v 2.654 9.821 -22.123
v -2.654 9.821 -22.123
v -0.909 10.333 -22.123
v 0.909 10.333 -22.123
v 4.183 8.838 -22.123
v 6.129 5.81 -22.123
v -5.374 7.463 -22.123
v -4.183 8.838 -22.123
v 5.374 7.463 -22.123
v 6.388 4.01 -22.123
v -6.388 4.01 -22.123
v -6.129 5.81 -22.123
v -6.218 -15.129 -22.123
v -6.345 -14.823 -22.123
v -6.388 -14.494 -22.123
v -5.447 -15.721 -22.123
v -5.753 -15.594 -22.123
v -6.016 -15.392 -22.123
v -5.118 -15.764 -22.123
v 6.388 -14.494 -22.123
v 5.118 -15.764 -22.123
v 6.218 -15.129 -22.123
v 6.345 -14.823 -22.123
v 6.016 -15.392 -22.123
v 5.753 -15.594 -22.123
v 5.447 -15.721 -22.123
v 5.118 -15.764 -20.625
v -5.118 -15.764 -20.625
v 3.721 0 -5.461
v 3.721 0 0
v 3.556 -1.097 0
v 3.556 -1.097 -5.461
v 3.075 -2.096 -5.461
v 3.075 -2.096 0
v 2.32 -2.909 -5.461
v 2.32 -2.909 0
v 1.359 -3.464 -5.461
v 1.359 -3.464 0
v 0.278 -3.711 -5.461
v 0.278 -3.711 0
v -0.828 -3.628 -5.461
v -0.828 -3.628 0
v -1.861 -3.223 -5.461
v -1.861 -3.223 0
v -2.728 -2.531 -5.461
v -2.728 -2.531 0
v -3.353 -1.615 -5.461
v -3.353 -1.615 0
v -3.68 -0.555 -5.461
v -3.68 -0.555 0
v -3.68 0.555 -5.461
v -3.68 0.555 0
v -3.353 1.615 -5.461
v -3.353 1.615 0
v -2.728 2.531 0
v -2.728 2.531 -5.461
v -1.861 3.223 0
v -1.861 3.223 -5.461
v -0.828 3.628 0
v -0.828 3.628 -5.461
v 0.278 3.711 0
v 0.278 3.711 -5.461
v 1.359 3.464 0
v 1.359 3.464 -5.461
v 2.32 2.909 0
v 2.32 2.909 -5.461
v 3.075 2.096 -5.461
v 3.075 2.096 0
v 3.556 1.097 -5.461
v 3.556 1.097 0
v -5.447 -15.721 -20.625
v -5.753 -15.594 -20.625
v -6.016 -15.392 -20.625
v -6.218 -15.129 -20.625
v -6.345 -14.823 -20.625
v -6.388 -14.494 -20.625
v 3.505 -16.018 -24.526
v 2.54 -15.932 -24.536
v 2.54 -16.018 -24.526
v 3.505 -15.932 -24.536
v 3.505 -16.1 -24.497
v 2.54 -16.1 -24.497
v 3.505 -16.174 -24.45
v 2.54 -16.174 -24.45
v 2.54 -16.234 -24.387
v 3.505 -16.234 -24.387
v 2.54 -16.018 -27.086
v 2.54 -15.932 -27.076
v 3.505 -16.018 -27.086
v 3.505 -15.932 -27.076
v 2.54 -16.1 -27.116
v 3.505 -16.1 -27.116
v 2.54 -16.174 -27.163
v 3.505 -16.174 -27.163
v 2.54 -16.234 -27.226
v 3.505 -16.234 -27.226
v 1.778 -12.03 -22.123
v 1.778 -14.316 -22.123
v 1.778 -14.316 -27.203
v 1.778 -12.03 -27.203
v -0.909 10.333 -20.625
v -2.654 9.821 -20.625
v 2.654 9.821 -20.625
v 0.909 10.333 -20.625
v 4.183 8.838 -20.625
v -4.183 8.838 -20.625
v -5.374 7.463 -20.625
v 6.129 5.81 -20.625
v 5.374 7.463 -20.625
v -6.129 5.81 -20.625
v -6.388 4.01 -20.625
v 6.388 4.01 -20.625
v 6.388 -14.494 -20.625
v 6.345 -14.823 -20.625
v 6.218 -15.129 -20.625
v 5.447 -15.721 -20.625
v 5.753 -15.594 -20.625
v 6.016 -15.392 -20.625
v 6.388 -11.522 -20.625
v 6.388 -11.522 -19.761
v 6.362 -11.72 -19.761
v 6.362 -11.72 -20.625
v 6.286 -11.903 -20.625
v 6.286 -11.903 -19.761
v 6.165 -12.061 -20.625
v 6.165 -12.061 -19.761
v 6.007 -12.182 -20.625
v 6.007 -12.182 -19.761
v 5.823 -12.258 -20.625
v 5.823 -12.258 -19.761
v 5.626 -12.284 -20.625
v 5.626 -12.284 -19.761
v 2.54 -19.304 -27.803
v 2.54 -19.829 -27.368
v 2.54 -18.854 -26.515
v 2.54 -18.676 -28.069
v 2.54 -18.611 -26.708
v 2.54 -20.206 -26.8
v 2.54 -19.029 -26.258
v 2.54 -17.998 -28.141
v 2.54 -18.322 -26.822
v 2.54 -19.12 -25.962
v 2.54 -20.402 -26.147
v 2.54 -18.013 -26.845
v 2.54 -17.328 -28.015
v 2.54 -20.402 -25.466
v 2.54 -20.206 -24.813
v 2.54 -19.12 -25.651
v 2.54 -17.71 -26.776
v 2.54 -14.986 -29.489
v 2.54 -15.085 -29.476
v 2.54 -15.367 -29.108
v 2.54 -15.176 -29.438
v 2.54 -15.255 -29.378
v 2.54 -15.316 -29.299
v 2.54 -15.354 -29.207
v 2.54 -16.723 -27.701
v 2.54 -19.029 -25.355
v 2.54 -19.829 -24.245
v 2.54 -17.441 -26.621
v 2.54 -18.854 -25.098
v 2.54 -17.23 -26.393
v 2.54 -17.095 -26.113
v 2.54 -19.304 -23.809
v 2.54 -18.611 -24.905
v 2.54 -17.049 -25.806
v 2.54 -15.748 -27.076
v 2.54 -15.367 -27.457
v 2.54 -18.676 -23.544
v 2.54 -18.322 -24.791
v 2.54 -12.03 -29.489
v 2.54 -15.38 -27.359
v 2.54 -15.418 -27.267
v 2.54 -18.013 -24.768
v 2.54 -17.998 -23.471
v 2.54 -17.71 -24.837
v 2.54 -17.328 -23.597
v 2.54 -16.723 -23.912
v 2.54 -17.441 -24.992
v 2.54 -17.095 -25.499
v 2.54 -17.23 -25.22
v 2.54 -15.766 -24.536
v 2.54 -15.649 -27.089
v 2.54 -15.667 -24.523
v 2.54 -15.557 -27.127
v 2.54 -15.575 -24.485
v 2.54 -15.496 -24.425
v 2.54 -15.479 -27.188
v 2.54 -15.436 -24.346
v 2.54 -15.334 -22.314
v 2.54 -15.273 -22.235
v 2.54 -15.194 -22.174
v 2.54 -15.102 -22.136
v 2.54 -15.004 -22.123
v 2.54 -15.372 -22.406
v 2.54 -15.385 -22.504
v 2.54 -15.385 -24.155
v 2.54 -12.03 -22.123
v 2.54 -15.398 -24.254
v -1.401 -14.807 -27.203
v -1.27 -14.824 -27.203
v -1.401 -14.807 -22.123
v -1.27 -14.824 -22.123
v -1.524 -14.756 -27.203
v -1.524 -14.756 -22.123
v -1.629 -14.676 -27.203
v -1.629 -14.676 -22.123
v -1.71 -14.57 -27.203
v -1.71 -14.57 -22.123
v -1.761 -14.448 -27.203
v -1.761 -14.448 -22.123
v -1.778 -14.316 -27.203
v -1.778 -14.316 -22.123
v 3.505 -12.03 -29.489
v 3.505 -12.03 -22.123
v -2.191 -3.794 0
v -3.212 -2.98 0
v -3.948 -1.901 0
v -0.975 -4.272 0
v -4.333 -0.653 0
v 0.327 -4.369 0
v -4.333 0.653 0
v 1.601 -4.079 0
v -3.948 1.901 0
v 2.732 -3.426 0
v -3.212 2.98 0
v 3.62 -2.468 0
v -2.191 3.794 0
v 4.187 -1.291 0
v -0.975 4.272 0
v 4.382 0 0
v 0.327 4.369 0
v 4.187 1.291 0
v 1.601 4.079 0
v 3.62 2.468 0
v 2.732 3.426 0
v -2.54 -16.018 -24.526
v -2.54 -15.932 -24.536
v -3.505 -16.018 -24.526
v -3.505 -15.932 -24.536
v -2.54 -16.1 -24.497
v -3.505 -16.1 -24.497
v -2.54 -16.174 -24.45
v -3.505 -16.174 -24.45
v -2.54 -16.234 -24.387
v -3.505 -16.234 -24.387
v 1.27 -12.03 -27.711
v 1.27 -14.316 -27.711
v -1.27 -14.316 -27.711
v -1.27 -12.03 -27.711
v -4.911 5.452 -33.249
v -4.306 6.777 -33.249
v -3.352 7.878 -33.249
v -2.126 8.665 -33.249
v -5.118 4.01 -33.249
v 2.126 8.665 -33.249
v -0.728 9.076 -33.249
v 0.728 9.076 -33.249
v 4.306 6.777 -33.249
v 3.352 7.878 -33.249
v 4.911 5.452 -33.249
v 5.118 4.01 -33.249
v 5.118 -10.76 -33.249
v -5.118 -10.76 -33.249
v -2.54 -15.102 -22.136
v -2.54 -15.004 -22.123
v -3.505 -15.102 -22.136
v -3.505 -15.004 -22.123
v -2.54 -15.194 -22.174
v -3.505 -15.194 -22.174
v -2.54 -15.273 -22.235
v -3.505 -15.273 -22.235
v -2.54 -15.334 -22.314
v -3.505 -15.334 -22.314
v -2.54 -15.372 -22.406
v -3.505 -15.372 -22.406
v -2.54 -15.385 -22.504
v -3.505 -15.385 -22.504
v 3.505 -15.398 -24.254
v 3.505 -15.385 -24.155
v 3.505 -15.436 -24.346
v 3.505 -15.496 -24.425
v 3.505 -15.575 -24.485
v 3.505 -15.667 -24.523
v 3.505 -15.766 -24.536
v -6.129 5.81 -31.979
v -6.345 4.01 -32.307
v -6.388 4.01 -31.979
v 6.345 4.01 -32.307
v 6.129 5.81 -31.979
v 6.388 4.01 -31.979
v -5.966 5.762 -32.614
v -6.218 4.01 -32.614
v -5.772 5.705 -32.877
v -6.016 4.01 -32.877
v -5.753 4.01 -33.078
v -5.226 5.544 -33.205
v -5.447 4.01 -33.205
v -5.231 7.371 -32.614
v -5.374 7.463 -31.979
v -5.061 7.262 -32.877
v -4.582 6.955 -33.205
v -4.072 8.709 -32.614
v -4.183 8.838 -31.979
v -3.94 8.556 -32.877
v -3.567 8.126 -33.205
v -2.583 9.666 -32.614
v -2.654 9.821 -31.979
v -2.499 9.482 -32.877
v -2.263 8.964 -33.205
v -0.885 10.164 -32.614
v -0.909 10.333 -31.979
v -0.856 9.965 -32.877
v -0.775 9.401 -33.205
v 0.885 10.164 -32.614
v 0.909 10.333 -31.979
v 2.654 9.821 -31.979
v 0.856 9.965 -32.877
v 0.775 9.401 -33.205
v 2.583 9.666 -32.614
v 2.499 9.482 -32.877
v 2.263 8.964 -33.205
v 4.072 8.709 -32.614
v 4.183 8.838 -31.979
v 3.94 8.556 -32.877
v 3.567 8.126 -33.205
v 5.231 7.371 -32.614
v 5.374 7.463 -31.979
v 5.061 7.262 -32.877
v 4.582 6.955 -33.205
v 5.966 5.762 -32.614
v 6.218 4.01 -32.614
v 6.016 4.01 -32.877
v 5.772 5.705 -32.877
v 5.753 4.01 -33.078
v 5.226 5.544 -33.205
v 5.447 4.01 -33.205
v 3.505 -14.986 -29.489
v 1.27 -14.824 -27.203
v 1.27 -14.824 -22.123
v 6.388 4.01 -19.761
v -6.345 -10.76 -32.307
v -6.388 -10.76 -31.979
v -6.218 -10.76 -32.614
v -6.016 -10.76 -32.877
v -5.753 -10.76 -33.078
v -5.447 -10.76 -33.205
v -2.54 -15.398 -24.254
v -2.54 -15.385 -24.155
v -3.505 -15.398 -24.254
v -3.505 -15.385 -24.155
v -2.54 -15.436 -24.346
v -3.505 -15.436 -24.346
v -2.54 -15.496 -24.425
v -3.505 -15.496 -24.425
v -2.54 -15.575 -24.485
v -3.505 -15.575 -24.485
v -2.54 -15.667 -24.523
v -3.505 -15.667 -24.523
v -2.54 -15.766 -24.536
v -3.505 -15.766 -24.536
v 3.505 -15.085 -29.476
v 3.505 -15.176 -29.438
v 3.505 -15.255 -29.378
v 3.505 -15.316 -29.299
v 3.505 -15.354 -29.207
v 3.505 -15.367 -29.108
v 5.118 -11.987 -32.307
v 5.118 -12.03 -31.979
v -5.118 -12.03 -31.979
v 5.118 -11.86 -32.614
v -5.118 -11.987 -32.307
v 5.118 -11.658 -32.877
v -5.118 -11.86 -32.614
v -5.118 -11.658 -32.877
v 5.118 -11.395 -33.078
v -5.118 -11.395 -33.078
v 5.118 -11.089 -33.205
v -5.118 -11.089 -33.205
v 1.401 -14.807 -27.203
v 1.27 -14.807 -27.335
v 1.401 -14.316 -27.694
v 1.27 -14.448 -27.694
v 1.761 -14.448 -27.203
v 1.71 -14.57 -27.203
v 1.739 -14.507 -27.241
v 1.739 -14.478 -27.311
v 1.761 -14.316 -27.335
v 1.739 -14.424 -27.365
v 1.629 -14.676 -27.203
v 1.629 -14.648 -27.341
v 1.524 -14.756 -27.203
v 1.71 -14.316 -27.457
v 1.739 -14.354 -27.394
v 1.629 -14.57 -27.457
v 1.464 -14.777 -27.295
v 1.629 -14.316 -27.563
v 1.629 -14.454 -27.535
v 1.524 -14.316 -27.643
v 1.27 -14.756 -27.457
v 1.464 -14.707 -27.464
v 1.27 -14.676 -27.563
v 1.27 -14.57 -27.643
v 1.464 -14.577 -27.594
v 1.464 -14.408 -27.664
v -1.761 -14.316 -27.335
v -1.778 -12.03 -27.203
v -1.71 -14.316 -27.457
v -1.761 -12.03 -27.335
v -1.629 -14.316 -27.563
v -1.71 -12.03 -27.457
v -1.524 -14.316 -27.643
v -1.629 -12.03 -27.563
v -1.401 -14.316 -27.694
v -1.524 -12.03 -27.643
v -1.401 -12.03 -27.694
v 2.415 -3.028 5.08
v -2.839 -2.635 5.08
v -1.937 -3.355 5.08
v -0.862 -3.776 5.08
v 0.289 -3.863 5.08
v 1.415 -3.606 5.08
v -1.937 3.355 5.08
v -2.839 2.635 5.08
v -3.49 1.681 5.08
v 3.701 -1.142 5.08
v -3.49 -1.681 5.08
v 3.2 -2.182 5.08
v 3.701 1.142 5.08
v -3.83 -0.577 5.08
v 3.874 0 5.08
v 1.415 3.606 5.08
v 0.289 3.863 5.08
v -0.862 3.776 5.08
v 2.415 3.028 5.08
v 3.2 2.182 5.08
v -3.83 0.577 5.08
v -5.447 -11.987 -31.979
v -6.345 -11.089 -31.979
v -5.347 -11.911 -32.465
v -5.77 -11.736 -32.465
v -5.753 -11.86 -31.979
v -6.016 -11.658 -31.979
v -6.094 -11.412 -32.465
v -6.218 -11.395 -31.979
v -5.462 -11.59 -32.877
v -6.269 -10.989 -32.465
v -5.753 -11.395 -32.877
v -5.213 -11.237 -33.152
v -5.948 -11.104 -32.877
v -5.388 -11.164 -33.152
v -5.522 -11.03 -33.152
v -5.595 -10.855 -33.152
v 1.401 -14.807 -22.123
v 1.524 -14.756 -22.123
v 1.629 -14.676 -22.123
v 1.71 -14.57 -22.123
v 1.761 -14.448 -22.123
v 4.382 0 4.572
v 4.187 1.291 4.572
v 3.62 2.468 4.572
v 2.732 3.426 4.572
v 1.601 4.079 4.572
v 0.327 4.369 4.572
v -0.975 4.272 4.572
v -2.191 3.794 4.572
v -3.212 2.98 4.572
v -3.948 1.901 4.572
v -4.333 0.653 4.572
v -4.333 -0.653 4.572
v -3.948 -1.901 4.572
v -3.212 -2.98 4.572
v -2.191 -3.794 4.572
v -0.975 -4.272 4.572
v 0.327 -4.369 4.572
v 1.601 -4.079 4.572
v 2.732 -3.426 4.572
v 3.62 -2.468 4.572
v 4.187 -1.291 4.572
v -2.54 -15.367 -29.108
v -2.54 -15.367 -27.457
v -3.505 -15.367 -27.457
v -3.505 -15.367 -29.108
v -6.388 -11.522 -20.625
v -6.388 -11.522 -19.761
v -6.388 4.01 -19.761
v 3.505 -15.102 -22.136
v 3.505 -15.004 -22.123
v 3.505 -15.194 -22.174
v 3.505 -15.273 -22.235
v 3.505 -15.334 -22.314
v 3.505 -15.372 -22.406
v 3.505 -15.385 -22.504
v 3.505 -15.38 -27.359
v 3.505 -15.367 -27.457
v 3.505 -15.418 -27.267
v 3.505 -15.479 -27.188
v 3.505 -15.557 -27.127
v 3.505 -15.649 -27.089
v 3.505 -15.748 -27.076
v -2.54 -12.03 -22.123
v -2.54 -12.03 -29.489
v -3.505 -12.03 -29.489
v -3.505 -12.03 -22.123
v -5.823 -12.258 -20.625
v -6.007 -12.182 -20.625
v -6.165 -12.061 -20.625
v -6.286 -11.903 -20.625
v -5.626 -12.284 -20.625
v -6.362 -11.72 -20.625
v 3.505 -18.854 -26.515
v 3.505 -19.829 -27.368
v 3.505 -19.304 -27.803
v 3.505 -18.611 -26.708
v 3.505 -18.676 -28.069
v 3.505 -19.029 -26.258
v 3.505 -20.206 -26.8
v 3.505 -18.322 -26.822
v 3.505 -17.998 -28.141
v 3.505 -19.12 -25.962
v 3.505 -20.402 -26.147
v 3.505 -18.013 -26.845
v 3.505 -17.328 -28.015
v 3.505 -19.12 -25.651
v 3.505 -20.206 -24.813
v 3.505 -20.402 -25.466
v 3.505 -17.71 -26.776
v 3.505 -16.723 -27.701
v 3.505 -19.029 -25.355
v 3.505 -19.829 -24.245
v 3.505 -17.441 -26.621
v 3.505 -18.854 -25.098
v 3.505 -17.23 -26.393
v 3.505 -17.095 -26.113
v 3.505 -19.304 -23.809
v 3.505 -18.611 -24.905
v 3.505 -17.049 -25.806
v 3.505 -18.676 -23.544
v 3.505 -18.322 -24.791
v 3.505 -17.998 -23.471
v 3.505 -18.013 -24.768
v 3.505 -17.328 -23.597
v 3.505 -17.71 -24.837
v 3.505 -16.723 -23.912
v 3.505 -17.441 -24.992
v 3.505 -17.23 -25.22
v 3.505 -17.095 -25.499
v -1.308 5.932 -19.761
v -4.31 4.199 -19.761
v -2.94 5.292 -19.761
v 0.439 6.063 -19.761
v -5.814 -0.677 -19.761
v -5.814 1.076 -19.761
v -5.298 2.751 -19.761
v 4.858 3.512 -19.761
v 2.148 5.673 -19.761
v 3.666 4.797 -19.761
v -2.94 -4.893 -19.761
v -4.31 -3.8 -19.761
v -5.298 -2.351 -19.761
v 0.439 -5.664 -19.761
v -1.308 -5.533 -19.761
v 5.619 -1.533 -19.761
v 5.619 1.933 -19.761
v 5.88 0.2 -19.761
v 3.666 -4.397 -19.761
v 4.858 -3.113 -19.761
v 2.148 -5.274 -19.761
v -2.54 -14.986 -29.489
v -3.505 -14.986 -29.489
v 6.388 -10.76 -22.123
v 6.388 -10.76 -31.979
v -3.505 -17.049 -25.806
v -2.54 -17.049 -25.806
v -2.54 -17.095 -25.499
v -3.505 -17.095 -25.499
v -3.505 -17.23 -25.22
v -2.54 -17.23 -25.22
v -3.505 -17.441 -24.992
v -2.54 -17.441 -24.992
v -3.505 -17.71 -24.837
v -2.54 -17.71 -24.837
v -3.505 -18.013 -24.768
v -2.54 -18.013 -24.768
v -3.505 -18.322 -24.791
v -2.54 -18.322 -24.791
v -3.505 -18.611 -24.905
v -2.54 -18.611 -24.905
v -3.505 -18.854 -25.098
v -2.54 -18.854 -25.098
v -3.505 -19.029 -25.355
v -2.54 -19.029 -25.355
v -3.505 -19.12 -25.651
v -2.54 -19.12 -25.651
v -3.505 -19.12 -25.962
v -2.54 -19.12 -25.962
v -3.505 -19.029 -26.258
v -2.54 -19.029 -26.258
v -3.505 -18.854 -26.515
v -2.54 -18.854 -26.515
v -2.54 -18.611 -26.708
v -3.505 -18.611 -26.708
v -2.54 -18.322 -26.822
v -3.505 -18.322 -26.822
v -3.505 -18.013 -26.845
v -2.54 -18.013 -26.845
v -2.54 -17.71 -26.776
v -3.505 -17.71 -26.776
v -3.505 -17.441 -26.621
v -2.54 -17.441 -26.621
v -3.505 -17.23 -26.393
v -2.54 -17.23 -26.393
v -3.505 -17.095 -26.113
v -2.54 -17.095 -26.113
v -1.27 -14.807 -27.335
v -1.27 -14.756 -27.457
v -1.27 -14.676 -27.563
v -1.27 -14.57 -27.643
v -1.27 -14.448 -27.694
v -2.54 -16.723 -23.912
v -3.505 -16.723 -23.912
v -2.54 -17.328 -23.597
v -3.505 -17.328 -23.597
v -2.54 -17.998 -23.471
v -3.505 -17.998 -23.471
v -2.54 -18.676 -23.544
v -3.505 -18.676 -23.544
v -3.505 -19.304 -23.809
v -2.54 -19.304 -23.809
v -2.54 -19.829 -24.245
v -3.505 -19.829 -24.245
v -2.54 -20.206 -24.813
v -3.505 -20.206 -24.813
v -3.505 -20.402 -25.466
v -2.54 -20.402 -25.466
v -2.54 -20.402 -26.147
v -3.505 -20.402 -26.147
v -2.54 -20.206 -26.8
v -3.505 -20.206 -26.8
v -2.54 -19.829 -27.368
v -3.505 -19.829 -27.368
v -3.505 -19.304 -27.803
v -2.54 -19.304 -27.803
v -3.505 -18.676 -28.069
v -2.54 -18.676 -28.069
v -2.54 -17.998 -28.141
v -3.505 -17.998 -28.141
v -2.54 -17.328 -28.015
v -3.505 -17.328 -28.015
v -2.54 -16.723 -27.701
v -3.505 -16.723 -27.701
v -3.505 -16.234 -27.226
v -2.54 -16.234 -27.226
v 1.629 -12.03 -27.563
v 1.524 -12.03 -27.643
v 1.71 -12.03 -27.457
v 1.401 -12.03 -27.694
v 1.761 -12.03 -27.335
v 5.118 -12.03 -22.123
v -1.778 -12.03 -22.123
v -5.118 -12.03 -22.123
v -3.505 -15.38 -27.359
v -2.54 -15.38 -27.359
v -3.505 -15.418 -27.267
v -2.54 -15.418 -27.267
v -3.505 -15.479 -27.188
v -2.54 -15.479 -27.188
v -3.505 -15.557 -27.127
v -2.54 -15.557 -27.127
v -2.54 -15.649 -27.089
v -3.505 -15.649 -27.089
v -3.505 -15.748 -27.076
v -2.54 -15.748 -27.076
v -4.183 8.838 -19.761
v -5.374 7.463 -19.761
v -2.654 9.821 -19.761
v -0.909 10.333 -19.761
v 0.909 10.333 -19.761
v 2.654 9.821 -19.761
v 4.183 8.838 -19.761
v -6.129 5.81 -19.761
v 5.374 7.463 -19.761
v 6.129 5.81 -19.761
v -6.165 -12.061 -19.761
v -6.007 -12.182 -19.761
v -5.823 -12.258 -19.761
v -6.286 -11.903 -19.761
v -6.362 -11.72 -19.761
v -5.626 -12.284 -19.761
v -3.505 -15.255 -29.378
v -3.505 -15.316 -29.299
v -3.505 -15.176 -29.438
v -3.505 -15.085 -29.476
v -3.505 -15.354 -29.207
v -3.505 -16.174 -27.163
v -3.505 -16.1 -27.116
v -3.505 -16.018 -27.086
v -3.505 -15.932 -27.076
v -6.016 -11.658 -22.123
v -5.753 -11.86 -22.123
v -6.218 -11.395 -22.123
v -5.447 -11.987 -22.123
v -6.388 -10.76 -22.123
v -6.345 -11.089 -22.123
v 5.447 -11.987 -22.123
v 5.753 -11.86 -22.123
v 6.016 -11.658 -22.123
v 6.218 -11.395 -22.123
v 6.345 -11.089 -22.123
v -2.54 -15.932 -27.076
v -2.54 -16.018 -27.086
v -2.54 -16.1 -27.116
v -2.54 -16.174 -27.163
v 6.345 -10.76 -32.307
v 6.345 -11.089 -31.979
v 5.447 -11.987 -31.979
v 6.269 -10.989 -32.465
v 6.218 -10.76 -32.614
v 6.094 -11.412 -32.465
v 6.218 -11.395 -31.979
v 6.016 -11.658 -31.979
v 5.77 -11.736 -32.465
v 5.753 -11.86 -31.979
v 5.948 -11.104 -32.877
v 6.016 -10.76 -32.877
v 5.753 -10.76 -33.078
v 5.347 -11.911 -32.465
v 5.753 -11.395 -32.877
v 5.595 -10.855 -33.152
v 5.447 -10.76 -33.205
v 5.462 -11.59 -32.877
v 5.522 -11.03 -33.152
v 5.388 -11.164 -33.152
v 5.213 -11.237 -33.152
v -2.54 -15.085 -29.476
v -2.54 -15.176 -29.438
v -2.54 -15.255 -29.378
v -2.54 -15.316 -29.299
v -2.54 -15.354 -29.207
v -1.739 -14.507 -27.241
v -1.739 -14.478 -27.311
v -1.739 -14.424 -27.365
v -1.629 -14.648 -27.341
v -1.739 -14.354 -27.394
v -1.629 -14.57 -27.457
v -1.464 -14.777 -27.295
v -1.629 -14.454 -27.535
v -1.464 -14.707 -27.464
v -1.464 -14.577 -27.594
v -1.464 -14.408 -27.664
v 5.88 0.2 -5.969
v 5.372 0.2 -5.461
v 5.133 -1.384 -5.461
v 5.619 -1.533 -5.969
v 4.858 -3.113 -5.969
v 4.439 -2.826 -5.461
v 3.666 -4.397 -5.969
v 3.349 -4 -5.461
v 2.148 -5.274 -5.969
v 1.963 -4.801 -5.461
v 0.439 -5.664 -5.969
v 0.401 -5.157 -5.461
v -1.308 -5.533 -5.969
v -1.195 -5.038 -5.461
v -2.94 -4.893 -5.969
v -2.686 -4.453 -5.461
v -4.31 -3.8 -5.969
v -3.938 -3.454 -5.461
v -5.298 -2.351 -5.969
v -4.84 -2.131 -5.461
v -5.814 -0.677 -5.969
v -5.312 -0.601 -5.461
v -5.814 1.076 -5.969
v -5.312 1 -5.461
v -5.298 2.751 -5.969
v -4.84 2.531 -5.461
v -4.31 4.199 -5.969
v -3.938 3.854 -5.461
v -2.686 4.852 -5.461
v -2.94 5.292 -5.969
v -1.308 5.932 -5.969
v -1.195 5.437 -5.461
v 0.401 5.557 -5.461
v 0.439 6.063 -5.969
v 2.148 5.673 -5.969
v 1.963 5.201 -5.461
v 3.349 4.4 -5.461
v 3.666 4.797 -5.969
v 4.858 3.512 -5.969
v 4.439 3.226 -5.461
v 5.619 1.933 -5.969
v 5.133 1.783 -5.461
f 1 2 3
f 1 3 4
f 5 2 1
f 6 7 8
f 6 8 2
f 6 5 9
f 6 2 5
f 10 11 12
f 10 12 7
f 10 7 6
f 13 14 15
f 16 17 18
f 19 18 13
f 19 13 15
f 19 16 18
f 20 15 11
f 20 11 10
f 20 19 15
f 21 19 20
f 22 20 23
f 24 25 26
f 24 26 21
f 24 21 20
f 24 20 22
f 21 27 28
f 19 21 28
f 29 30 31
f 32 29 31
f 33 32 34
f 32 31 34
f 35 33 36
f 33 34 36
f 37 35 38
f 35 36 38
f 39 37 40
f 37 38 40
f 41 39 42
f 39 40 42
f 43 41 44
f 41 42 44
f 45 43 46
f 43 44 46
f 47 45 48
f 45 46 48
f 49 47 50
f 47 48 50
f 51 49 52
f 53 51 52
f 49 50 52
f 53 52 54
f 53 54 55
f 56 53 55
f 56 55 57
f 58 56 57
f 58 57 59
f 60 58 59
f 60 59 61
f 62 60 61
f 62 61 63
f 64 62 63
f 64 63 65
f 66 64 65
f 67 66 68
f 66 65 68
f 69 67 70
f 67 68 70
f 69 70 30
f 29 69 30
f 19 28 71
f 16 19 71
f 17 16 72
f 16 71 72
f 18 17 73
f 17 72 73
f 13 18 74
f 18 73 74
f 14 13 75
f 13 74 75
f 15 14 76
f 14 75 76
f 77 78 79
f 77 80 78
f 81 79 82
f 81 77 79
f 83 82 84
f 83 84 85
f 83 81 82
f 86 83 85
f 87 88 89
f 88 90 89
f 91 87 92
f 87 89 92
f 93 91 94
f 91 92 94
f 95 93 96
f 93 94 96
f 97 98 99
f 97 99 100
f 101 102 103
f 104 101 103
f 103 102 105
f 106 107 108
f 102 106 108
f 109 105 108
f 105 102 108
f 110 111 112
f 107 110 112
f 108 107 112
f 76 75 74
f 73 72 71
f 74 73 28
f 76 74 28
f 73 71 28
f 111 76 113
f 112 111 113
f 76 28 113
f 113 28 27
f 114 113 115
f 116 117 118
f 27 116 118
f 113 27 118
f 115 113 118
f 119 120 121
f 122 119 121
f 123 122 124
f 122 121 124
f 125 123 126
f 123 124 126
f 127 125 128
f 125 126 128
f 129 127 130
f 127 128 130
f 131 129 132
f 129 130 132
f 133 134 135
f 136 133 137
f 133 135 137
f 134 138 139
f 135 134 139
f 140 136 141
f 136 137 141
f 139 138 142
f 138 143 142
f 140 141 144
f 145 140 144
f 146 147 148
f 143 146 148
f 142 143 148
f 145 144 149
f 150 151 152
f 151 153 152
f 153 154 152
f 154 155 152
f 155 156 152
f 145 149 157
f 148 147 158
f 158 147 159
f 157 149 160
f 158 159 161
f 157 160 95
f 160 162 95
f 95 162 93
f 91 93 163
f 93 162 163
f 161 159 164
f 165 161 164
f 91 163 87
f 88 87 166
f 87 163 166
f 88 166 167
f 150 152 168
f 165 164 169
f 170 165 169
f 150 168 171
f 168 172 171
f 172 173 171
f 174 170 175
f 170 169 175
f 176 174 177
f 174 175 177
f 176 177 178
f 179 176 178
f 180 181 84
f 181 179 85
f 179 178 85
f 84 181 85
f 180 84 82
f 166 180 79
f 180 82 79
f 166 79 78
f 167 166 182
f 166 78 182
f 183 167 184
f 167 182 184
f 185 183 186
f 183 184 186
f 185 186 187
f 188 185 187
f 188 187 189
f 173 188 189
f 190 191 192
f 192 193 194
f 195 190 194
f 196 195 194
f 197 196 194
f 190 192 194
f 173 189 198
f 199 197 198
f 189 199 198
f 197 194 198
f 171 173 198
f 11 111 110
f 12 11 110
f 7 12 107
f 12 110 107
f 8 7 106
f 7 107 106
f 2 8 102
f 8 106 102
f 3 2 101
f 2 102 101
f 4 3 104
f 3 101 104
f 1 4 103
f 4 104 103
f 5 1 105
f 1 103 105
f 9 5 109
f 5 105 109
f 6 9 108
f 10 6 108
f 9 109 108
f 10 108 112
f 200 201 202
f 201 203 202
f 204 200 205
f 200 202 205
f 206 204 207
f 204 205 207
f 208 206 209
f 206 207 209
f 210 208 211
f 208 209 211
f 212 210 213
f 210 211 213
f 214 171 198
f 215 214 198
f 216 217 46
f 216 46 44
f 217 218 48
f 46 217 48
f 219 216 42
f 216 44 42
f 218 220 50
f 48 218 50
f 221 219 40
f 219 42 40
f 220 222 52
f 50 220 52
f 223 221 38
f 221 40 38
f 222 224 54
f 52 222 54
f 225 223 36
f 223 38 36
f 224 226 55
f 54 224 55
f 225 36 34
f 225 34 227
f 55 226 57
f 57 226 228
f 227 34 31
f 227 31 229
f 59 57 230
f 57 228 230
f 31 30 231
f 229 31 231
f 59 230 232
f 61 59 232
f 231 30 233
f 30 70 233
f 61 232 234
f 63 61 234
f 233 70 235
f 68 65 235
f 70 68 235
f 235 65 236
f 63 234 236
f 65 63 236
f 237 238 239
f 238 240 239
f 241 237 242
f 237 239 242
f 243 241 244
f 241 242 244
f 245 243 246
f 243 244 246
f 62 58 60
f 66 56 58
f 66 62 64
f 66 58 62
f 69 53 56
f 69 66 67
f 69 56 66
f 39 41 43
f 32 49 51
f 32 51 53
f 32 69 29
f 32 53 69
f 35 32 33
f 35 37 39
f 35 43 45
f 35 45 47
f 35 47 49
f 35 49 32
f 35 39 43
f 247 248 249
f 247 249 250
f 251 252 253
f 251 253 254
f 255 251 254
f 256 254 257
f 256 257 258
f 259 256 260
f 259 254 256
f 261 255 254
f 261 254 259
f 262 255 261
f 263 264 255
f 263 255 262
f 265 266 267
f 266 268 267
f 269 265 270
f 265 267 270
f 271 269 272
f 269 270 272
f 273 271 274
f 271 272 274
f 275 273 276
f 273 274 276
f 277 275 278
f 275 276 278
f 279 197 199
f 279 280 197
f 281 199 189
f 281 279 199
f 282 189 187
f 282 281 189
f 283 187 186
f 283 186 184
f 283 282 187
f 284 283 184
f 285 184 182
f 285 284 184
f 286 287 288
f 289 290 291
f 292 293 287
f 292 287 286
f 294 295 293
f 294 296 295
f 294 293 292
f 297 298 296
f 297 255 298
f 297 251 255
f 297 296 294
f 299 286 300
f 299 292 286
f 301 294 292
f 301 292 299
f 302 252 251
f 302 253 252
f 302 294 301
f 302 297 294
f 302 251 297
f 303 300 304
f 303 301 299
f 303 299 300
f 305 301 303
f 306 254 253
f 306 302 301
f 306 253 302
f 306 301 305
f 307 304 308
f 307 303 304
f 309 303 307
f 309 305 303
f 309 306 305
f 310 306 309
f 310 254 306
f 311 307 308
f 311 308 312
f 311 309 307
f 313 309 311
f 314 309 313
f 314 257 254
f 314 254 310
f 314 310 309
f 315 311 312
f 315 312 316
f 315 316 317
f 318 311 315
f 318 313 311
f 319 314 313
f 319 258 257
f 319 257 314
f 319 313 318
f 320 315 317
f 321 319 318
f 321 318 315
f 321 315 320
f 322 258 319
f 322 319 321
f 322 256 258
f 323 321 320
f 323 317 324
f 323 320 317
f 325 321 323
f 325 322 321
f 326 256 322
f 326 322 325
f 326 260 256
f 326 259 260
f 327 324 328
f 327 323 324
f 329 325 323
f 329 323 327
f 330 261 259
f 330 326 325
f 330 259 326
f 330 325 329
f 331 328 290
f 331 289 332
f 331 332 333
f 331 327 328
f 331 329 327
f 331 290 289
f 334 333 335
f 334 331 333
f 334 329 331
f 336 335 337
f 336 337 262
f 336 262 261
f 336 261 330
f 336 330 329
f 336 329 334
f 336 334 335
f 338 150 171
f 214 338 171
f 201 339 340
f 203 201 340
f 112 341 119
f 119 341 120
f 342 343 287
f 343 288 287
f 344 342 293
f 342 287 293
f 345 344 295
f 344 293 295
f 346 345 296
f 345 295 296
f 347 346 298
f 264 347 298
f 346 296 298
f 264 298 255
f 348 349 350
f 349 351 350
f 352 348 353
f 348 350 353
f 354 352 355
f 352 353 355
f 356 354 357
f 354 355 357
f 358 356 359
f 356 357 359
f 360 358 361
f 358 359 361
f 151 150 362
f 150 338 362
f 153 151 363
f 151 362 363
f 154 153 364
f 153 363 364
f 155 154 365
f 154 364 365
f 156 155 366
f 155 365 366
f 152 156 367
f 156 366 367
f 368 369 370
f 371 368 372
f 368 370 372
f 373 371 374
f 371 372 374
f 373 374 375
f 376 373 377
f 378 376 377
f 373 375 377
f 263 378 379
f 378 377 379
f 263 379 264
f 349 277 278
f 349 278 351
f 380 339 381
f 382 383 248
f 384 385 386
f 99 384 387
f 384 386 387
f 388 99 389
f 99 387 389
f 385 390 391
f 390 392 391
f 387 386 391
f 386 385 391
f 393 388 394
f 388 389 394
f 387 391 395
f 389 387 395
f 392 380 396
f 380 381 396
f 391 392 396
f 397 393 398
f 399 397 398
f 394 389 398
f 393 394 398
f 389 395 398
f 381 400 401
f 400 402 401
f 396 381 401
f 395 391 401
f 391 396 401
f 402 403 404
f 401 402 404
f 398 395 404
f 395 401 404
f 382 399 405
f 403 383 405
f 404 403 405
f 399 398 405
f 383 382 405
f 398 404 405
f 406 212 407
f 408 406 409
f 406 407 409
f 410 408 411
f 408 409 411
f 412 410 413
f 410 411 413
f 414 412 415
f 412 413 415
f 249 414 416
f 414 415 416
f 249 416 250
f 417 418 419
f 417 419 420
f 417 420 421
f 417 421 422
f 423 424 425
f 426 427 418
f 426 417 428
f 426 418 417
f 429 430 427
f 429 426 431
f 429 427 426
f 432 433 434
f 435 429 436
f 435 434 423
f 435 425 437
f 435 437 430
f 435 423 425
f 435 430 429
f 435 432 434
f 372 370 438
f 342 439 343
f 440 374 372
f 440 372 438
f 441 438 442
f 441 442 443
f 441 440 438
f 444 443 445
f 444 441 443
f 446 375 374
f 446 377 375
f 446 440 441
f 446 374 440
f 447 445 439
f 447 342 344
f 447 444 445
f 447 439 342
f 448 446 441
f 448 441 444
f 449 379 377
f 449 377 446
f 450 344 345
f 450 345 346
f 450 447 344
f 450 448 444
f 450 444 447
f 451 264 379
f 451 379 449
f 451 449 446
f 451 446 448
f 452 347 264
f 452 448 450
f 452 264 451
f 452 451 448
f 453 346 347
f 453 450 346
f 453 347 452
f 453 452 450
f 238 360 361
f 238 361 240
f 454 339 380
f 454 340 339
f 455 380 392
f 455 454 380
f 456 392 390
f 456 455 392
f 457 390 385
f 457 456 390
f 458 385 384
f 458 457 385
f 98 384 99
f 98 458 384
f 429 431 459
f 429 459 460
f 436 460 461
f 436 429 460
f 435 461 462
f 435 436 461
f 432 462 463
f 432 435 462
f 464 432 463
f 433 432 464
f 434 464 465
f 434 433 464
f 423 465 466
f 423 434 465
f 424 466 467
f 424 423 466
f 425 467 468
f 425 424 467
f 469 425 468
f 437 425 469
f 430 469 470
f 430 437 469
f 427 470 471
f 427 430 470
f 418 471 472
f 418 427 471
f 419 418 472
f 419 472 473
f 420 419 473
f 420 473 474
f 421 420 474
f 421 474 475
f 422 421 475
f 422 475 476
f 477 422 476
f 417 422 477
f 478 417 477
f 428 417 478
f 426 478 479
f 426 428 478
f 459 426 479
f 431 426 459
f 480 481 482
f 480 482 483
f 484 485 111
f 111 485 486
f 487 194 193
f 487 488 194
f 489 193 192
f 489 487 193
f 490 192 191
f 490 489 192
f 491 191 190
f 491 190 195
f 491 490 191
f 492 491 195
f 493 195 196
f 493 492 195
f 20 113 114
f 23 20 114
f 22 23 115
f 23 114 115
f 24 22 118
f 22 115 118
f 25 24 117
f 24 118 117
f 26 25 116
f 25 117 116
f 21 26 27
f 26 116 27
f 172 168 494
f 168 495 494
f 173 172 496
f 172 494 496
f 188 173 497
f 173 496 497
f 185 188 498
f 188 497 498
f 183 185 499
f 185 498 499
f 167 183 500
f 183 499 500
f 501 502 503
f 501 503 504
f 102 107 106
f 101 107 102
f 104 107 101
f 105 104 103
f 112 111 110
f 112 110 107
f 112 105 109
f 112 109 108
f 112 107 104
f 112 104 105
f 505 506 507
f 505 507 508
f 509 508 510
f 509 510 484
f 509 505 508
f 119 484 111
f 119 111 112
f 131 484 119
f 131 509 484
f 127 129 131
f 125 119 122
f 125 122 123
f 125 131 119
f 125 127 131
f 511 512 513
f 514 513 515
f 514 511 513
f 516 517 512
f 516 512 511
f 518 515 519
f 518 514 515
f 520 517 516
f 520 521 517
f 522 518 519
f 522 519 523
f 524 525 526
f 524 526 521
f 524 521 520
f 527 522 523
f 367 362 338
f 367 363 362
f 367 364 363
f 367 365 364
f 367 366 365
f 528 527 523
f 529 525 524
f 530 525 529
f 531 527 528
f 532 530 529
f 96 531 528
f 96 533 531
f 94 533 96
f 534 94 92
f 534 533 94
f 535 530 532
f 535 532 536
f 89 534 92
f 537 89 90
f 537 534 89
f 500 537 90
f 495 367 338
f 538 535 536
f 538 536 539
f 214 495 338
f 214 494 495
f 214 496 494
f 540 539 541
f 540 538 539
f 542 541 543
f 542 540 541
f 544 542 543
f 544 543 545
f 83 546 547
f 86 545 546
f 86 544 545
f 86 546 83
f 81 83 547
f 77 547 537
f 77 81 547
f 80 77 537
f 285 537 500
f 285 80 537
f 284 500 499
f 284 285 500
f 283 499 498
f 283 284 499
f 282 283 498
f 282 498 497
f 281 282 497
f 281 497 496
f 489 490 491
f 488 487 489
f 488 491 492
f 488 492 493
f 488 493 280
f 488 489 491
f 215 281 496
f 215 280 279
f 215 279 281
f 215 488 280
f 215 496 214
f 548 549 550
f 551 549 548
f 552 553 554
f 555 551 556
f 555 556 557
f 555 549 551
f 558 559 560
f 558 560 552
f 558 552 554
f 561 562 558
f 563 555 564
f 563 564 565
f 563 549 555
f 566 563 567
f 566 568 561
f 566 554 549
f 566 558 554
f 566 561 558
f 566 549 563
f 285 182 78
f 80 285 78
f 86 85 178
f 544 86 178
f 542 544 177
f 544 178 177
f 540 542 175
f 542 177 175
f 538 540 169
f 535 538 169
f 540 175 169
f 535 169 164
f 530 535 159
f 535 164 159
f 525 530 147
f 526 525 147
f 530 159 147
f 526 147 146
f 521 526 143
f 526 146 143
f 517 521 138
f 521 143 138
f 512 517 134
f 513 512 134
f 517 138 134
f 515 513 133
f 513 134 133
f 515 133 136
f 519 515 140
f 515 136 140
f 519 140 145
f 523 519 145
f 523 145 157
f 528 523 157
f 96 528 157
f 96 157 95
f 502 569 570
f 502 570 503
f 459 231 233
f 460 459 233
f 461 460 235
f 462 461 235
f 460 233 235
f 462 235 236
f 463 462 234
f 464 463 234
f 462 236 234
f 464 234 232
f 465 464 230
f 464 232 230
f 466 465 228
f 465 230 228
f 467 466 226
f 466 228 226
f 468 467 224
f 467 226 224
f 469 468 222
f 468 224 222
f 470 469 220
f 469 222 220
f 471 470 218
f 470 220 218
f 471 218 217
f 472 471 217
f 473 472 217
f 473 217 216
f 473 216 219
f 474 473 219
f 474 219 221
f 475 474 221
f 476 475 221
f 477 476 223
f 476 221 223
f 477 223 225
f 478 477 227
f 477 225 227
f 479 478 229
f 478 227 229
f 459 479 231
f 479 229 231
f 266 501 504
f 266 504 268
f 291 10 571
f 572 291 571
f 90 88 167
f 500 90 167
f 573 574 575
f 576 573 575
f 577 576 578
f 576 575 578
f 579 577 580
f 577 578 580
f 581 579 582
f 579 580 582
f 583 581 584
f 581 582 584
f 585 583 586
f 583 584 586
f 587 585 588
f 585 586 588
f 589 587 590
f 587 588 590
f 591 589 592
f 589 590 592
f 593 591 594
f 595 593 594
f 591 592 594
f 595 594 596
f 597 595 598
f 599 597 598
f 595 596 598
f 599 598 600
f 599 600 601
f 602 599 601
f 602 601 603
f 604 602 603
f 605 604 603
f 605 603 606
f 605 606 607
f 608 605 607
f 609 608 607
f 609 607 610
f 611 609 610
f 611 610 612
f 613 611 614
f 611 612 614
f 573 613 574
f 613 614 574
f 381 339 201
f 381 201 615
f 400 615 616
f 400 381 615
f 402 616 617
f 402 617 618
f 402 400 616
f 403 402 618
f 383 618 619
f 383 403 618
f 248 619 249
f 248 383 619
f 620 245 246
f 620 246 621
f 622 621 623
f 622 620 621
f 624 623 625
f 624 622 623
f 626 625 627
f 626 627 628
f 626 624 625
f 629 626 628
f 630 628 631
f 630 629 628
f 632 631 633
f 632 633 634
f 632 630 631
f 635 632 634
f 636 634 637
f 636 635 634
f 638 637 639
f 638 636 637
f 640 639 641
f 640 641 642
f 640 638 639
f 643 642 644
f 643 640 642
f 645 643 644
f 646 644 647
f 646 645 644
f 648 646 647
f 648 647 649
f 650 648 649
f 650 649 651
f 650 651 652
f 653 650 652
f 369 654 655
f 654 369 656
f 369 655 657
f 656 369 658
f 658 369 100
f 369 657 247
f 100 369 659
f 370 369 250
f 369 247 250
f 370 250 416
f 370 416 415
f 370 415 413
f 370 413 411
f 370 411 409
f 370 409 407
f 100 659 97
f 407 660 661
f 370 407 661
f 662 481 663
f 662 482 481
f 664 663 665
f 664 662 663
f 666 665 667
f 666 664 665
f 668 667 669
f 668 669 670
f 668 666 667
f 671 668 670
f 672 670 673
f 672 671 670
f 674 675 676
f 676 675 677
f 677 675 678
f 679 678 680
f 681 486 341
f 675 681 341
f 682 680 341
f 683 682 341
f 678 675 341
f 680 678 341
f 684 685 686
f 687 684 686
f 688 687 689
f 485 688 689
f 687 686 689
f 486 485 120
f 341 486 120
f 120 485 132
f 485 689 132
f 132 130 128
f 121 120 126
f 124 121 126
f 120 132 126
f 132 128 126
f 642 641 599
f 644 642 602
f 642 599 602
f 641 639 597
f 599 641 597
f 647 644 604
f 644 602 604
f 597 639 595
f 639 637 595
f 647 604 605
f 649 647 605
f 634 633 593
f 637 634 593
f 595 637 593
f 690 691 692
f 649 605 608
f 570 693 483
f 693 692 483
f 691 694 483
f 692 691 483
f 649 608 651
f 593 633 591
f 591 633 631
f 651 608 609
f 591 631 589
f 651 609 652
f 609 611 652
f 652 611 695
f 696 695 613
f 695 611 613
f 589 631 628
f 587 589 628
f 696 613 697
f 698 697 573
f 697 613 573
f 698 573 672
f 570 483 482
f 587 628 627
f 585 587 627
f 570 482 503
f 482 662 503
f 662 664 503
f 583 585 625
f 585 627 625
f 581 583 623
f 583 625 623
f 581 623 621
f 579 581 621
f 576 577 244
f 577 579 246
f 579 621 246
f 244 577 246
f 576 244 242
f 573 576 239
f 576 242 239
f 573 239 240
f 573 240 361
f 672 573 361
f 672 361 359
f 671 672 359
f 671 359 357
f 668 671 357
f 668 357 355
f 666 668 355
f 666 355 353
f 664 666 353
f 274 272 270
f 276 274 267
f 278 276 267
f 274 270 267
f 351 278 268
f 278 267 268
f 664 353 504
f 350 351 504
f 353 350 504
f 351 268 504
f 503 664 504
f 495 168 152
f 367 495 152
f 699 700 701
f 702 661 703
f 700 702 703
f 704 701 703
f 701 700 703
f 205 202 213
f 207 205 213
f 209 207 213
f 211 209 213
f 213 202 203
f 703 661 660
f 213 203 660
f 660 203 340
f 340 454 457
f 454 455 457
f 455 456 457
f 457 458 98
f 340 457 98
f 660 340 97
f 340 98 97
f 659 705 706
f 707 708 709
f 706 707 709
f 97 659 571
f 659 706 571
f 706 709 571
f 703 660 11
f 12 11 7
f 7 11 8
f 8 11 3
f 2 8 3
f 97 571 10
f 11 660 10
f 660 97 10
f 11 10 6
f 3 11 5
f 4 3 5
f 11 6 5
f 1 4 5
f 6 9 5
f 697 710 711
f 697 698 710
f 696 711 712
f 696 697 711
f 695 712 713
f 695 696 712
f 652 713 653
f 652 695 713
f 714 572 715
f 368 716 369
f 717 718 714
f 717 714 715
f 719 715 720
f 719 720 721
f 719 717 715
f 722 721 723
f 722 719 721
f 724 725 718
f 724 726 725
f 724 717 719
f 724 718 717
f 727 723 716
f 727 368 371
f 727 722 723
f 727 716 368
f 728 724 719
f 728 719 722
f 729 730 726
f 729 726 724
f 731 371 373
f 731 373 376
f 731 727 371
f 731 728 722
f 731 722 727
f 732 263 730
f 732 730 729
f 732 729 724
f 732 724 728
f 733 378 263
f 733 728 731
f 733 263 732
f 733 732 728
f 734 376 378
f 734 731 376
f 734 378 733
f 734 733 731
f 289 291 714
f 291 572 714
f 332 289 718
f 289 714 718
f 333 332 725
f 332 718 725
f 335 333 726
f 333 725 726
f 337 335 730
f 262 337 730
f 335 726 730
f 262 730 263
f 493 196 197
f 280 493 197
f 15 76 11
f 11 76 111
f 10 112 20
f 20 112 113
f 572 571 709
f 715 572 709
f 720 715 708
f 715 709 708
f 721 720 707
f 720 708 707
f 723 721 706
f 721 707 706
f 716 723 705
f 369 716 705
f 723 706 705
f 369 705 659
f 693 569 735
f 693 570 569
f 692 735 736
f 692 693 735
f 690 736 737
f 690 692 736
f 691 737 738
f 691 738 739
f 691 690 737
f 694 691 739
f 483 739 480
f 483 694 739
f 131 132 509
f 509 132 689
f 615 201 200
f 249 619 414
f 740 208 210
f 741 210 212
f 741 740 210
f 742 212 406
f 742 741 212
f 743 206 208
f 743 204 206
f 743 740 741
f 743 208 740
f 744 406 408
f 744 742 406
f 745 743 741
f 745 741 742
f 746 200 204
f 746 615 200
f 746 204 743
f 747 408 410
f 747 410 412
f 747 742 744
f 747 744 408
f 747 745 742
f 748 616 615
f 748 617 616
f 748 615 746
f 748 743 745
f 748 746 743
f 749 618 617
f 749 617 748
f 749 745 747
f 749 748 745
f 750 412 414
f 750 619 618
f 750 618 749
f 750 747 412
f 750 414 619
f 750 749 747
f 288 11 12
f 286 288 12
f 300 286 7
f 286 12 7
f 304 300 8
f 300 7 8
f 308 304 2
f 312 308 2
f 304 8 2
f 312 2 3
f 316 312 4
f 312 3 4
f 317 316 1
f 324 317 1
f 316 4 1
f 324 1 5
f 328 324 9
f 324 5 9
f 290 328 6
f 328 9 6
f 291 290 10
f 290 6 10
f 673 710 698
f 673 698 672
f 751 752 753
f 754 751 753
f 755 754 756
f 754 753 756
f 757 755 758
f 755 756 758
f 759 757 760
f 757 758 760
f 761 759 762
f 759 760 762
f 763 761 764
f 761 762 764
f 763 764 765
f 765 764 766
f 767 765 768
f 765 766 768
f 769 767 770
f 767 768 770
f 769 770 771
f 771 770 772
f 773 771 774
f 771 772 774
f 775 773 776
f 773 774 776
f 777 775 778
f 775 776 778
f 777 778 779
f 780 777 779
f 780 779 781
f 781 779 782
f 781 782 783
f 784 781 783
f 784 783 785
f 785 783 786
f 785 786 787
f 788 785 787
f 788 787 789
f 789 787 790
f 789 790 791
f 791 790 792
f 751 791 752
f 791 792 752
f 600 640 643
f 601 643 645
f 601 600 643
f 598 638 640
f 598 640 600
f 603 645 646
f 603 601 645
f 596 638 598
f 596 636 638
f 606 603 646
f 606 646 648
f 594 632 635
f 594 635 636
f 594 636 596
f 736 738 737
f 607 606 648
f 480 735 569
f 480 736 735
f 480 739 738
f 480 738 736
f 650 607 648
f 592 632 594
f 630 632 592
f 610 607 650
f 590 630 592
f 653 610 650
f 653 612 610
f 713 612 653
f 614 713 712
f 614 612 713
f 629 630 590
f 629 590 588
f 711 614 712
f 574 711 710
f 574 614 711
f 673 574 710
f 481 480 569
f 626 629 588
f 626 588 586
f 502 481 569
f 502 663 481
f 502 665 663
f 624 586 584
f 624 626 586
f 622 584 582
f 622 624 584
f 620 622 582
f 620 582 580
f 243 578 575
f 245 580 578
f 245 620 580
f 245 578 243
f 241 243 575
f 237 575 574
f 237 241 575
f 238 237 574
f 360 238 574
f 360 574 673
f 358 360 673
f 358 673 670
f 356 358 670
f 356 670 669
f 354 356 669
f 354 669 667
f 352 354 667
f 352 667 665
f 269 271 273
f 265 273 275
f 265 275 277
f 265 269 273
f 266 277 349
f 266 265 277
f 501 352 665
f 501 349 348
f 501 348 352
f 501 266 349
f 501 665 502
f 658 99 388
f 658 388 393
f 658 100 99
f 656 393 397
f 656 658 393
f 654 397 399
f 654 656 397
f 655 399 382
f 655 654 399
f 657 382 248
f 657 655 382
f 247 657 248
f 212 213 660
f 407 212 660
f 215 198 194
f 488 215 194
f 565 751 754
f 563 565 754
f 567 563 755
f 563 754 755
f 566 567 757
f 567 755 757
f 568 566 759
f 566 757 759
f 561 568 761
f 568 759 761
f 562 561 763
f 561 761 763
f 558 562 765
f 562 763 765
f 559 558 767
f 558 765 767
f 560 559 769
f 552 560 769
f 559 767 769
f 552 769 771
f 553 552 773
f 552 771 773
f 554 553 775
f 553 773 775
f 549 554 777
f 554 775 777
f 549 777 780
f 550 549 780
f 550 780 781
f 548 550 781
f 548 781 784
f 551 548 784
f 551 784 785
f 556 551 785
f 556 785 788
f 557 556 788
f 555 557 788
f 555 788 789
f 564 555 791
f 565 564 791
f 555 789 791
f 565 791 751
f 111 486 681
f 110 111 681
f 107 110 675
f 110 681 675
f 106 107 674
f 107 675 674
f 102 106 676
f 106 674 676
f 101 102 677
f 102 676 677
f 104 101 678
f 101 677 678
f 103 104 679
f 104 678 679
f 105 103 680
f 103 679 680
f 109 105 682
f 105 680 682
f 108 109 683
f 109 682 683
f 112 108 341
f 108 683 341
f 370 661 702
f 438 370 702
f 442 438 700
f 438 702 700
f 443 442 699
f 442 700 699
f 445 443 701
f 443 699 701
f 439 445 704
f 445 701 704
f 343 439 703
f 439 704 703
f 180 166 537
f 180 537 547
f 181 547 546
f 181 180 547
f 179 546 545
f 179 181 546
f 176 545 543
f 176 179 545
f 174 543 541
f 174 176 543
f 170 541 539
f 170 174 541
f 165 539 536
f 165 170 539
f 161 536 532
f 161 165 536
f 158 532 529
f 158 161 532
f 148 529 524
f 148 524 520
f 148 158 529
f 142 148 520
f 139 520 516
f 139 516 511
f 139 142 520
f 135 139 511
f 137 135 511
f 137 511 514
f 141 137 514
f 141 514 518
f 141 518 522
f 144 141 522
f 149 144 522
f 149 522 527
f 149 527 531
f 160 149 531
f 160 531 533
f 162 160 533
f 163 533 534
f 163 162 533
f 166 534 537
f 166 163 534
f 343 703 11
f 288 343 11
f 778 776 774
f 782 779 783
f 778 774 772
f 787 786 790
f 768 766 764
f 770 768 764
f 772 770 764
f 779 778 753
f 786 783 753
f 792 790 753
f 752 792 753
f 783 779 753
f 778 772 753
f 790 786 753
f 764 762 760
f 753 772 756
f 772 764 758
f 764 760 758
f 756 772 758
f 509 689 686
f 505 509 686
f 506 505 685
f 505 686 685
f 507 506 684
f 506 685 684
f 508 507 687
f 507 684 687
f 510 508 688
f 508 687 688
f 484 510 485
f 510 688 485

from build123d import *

# Parameters (mm, degrees)
F0_R           = 4.3815
F1_DEPTH       = 5.08
F2_R           = 3.7211
F3_DEPTH       = 5.461
F4_R           = 5.8801
F5_DEPTH       = 14.3002
F6_SIZE        = 0.508
F6_2_SIZE      = 0.508
F8_DEPTH       = 0.8636
F10_DEPTH      = 1.4986
F12_DEPTH      = 11.1252
F13_R          = 1.27
F14_W          = 2.794
F14_H          = 5.588
F15_DEPTH      = 1.778
F15_DEPTH_BACK = 1.778
F16_R          = 0.508
F18_R          = 1.0414
F19_DEPTH      = 0.9652
F21_R          = 0.381
F21_2_R        = 0.381


with BuildPart() as f1:
    # F0 (on Top) → F1 (new body)
    with BuildSketch(Plane.XY):
        Circle(F0_R)
    extrude(amount=F1_DEPTH)

    # F2 (on face) → F3 (join)
    with BuildSketch(Plane(origin=(0, 0, 0), x_dir=(1, 0, 0), z_dir=(0, 0, -1))):
        Circle(F2_R)
    extrude(amount=F3_DEPTH)

    # F6
    f6_edges = [f1.edges().sort_by_distance(p)[0] for p in [
        (-4.3815, 0, 5.08),
    ]]
    chamfer(f6_edges, length=F6_SIZE)


with BuildPart() as f5:
    # F4 (on face) → F5 (new body)
    with BuildSketch(Plane(origin=(0, 0, -5.461), x_dir=(1, 0, 0), z_dir=(0, 0, -1))):
        with Locations((0, -0.1997926142)):
            Circle(F4_R)
    extrude(amount=F5_DEPTH)

    # F6#2
    f6_2_edges = [f5.edges().sort_by_distance(p)[0] for p in [
        (-5.8801, 0.199793, -5.461),
    ]]
    chamfer(f6_2_edges, length=F6_2_SIZE)


with BuildPart() as f8:
    # F7 (on face) → F8 (new body)
    with BuildSketch(Plane(origin=(0, 0, -19.7612), x_dir=(1, 0, 0), z_dir=(0, 0, -1))):
        with BuildLine():
            Line((5.6261, 12.2843073858), (-5.6261, 12.2843073858))
            ThreePointArc((-5.6261, 12.2843073858), (-6.1649153673, 12.061122753), (-6.3881, 11.5223073858))
            Line((-6.3881, 11.5223073858), (-6.3881, -4.0097926142))
            ThreePointArc((-6.3881, -4.0097926142), (0, -10.3978926142), (6.3881, -4.0097926142))
            Line((6.3881, -4.0097926142), (6.3881, 11.5223073858))
            ThreePointArc((6.3881, 11.5223073858), (6.1649153673, 12.061122753), (5.6261, 12.2843073858))
        make_face()
    extrude(amount=F8_DEPTH)


with BuildPart() as f10:
    # F9 (on face) → F10 (new body)
    with BuildSketch(Plane(origin=(0, 0, -20.6248), x_dir=(1, 0, 0), z_dir=(0, 0, -1))):
        with BuildLine():
            Line((-6.3881, 11.5223073858), (-6.3881, -4.0097926142))
            ThreePointArc((-6.3881, -4.0097926142), (0, -10.3978926142), (6.3881, -4.0097926142))
            Line((6.3881, -4.0097926142), (6.3881, 11.5223073858))
            Line((6.3881, 11.5223073858), (6.3881, 14.4941073858))
            ThreePointArc((6.3881, 14.4941073858), (6.0161256121, 15.3921329979), (5.1181, 15.7641073858))
            Line((5.1181, 15.7641073858), (-5.1181, 15.7641073858))
            ThreePointArc((-5.1181, 15.7641073858), (-6.0161256121, 15.3921329979), (-6.3881, 14.4941073858))
            Line((-6.3881, 14.4941073858), (-6.3881, 11.5223073858))
        make_face()
    extrude(amount=F10_DEPTH)


with BuildPart() as f12:
    # F11 (on face) → F12 (new body)
    with BuildSketch(Plane(origin=(0, 0, -22.1234), x_dir=(1, 0, 0), z_dir=(0, 0, -1))):
        with BuildLine():
            Line((-6.3881, 10.7603073858), (-6.3881, -4.0097926142))
            ThreePointArc((-6.3881, -4.0097926142), (0, -10.3978926142), (6.3881, -4.0097926142))
            Line((6.3881, -4.0097926142), (6.3881, 10.7603073858))
            ThreePointArc((6.3881, 10.7603073858), (6.0161256121, 11.6583329979), (5.1181, 12.0303073858))
            Line((5.1181, 12.0303073858), (-5.1181, 12.0303073858))
            ThreePointArc((-5.1181, 12.0303073858), (-6.0161256121, 11.6583329979), (-6.3881, 10.7603073858))
        make_face()
    extrude(amount=F12_DEPTH)

    # F13
    f13_edges = [f12.edges().sort_by_distance(p)[0] for p in [
        (-6.3881, -3.375257, -33.2486),
    ]]
    fillet(f13_edges, radius=F13_R)

    # F14 (on Right) → F15 (join, two sides)
    with BuildSketch(Plane.YZ) as f15_sk:
        with Locations((-13.4273073858, -24.9174)):
            Rectangle(F14_W, F14_H)
    extrude(amount=F15_DEPTH)
    extrude(f15_sk.sketch, amount=-F15_DEPTH_BACK)

    # F16
    f16_edges = [f12.edges().sort_by_distance(p)[0] for p in [
        (0, -14.824307, -27.7114),
        (-1.778, -14.824307, -24.9174),
        (1.778, -14.824307, -24.9174),
        (-1.778, -13.427307, -27.7114),
        (1.778, -13.427307, -27.7114),
    ]]
    fillet(f16_edges, radius=F16_R)


with BuildPart() as f19:
    # F18 (on offset) → F19 (new body)
    with BuildSketch(Plane.YZ.offset(2.54)):
        with BuildLine():
            Line((-12.0303073858, -29.4894), (-12.0303073858, -22.1234))
            Line((-12.0303073858, -22.1234), (-15.3846076557, -22.1234))
            Line((-15.3846076557, -22.1234), (-15.3846076557, -24.5364))
            Line((-15.3846076557, -24.5364), (-16.1289302219, -24.5364))
            ThreePointArc((-16.1289302219, -24.5364), (-20.4272944549, -25.8064), (-16.1289302219, -27.0764))
            Line((-16.1289302219, -27.0764), (-15.3669302219, -27.0764))
            Line((-15.3669302219, -27.0764), (-15.3669302219, -29.4894))
            Line((-15.3669302219, -29.4894), (-12.0303073858, -29.4894))
        make_face()
        with Locations((-18.0904944549, -25.8064)):
            Circle(F18_R, mode=Mode.SUBTRACT)
    extrude(amount=F19_DEPTH)


with BuildPart() as f20_1:
    # F20: instance of F19
    add(f19.part.mirror(Plane.YZ))

    # F21#2
    f21_2_edges = [f20_1.edges().sort_by_distance(p)[0] for p in [
        (-3.0226, -15.36693, -29.4894),
        (-3.0226, -15.36693, -27.0764),
        (-3.0226, -16.12893, -27.0764),
        (-3.0226, -15.384608, -22.1234),
        (-3.0226, -15.384608, -24.5364),
        (-3.0226, -16.12893, -24.5364),
    ]]
    fillet(f21_2_edges, radius=F21_2_R)


with BuildPart() as f19_1:
    add(f19.part)

    # F21
    f21_edges = [f19_1.edges().sort_by_distance(p)[0] for p in [
        (3.0226, -15.36693, -29.4894),
        (3.0226, -15.36693, -27.0764),
        (3.0226, -16.12893, -27.0764),
        (3.0226, -15.384608, -24.5364),
        (3.0226, -16.12893, -24.5364),
        (3.0226, -15.384608, -22.1234),
    ]]
    fillet(f21_edges, radius=F21_R)


solid = Compound([f1.part, f5.part, f8.part, f10.part, f12.part, f20_1.part, f19_1.part])
